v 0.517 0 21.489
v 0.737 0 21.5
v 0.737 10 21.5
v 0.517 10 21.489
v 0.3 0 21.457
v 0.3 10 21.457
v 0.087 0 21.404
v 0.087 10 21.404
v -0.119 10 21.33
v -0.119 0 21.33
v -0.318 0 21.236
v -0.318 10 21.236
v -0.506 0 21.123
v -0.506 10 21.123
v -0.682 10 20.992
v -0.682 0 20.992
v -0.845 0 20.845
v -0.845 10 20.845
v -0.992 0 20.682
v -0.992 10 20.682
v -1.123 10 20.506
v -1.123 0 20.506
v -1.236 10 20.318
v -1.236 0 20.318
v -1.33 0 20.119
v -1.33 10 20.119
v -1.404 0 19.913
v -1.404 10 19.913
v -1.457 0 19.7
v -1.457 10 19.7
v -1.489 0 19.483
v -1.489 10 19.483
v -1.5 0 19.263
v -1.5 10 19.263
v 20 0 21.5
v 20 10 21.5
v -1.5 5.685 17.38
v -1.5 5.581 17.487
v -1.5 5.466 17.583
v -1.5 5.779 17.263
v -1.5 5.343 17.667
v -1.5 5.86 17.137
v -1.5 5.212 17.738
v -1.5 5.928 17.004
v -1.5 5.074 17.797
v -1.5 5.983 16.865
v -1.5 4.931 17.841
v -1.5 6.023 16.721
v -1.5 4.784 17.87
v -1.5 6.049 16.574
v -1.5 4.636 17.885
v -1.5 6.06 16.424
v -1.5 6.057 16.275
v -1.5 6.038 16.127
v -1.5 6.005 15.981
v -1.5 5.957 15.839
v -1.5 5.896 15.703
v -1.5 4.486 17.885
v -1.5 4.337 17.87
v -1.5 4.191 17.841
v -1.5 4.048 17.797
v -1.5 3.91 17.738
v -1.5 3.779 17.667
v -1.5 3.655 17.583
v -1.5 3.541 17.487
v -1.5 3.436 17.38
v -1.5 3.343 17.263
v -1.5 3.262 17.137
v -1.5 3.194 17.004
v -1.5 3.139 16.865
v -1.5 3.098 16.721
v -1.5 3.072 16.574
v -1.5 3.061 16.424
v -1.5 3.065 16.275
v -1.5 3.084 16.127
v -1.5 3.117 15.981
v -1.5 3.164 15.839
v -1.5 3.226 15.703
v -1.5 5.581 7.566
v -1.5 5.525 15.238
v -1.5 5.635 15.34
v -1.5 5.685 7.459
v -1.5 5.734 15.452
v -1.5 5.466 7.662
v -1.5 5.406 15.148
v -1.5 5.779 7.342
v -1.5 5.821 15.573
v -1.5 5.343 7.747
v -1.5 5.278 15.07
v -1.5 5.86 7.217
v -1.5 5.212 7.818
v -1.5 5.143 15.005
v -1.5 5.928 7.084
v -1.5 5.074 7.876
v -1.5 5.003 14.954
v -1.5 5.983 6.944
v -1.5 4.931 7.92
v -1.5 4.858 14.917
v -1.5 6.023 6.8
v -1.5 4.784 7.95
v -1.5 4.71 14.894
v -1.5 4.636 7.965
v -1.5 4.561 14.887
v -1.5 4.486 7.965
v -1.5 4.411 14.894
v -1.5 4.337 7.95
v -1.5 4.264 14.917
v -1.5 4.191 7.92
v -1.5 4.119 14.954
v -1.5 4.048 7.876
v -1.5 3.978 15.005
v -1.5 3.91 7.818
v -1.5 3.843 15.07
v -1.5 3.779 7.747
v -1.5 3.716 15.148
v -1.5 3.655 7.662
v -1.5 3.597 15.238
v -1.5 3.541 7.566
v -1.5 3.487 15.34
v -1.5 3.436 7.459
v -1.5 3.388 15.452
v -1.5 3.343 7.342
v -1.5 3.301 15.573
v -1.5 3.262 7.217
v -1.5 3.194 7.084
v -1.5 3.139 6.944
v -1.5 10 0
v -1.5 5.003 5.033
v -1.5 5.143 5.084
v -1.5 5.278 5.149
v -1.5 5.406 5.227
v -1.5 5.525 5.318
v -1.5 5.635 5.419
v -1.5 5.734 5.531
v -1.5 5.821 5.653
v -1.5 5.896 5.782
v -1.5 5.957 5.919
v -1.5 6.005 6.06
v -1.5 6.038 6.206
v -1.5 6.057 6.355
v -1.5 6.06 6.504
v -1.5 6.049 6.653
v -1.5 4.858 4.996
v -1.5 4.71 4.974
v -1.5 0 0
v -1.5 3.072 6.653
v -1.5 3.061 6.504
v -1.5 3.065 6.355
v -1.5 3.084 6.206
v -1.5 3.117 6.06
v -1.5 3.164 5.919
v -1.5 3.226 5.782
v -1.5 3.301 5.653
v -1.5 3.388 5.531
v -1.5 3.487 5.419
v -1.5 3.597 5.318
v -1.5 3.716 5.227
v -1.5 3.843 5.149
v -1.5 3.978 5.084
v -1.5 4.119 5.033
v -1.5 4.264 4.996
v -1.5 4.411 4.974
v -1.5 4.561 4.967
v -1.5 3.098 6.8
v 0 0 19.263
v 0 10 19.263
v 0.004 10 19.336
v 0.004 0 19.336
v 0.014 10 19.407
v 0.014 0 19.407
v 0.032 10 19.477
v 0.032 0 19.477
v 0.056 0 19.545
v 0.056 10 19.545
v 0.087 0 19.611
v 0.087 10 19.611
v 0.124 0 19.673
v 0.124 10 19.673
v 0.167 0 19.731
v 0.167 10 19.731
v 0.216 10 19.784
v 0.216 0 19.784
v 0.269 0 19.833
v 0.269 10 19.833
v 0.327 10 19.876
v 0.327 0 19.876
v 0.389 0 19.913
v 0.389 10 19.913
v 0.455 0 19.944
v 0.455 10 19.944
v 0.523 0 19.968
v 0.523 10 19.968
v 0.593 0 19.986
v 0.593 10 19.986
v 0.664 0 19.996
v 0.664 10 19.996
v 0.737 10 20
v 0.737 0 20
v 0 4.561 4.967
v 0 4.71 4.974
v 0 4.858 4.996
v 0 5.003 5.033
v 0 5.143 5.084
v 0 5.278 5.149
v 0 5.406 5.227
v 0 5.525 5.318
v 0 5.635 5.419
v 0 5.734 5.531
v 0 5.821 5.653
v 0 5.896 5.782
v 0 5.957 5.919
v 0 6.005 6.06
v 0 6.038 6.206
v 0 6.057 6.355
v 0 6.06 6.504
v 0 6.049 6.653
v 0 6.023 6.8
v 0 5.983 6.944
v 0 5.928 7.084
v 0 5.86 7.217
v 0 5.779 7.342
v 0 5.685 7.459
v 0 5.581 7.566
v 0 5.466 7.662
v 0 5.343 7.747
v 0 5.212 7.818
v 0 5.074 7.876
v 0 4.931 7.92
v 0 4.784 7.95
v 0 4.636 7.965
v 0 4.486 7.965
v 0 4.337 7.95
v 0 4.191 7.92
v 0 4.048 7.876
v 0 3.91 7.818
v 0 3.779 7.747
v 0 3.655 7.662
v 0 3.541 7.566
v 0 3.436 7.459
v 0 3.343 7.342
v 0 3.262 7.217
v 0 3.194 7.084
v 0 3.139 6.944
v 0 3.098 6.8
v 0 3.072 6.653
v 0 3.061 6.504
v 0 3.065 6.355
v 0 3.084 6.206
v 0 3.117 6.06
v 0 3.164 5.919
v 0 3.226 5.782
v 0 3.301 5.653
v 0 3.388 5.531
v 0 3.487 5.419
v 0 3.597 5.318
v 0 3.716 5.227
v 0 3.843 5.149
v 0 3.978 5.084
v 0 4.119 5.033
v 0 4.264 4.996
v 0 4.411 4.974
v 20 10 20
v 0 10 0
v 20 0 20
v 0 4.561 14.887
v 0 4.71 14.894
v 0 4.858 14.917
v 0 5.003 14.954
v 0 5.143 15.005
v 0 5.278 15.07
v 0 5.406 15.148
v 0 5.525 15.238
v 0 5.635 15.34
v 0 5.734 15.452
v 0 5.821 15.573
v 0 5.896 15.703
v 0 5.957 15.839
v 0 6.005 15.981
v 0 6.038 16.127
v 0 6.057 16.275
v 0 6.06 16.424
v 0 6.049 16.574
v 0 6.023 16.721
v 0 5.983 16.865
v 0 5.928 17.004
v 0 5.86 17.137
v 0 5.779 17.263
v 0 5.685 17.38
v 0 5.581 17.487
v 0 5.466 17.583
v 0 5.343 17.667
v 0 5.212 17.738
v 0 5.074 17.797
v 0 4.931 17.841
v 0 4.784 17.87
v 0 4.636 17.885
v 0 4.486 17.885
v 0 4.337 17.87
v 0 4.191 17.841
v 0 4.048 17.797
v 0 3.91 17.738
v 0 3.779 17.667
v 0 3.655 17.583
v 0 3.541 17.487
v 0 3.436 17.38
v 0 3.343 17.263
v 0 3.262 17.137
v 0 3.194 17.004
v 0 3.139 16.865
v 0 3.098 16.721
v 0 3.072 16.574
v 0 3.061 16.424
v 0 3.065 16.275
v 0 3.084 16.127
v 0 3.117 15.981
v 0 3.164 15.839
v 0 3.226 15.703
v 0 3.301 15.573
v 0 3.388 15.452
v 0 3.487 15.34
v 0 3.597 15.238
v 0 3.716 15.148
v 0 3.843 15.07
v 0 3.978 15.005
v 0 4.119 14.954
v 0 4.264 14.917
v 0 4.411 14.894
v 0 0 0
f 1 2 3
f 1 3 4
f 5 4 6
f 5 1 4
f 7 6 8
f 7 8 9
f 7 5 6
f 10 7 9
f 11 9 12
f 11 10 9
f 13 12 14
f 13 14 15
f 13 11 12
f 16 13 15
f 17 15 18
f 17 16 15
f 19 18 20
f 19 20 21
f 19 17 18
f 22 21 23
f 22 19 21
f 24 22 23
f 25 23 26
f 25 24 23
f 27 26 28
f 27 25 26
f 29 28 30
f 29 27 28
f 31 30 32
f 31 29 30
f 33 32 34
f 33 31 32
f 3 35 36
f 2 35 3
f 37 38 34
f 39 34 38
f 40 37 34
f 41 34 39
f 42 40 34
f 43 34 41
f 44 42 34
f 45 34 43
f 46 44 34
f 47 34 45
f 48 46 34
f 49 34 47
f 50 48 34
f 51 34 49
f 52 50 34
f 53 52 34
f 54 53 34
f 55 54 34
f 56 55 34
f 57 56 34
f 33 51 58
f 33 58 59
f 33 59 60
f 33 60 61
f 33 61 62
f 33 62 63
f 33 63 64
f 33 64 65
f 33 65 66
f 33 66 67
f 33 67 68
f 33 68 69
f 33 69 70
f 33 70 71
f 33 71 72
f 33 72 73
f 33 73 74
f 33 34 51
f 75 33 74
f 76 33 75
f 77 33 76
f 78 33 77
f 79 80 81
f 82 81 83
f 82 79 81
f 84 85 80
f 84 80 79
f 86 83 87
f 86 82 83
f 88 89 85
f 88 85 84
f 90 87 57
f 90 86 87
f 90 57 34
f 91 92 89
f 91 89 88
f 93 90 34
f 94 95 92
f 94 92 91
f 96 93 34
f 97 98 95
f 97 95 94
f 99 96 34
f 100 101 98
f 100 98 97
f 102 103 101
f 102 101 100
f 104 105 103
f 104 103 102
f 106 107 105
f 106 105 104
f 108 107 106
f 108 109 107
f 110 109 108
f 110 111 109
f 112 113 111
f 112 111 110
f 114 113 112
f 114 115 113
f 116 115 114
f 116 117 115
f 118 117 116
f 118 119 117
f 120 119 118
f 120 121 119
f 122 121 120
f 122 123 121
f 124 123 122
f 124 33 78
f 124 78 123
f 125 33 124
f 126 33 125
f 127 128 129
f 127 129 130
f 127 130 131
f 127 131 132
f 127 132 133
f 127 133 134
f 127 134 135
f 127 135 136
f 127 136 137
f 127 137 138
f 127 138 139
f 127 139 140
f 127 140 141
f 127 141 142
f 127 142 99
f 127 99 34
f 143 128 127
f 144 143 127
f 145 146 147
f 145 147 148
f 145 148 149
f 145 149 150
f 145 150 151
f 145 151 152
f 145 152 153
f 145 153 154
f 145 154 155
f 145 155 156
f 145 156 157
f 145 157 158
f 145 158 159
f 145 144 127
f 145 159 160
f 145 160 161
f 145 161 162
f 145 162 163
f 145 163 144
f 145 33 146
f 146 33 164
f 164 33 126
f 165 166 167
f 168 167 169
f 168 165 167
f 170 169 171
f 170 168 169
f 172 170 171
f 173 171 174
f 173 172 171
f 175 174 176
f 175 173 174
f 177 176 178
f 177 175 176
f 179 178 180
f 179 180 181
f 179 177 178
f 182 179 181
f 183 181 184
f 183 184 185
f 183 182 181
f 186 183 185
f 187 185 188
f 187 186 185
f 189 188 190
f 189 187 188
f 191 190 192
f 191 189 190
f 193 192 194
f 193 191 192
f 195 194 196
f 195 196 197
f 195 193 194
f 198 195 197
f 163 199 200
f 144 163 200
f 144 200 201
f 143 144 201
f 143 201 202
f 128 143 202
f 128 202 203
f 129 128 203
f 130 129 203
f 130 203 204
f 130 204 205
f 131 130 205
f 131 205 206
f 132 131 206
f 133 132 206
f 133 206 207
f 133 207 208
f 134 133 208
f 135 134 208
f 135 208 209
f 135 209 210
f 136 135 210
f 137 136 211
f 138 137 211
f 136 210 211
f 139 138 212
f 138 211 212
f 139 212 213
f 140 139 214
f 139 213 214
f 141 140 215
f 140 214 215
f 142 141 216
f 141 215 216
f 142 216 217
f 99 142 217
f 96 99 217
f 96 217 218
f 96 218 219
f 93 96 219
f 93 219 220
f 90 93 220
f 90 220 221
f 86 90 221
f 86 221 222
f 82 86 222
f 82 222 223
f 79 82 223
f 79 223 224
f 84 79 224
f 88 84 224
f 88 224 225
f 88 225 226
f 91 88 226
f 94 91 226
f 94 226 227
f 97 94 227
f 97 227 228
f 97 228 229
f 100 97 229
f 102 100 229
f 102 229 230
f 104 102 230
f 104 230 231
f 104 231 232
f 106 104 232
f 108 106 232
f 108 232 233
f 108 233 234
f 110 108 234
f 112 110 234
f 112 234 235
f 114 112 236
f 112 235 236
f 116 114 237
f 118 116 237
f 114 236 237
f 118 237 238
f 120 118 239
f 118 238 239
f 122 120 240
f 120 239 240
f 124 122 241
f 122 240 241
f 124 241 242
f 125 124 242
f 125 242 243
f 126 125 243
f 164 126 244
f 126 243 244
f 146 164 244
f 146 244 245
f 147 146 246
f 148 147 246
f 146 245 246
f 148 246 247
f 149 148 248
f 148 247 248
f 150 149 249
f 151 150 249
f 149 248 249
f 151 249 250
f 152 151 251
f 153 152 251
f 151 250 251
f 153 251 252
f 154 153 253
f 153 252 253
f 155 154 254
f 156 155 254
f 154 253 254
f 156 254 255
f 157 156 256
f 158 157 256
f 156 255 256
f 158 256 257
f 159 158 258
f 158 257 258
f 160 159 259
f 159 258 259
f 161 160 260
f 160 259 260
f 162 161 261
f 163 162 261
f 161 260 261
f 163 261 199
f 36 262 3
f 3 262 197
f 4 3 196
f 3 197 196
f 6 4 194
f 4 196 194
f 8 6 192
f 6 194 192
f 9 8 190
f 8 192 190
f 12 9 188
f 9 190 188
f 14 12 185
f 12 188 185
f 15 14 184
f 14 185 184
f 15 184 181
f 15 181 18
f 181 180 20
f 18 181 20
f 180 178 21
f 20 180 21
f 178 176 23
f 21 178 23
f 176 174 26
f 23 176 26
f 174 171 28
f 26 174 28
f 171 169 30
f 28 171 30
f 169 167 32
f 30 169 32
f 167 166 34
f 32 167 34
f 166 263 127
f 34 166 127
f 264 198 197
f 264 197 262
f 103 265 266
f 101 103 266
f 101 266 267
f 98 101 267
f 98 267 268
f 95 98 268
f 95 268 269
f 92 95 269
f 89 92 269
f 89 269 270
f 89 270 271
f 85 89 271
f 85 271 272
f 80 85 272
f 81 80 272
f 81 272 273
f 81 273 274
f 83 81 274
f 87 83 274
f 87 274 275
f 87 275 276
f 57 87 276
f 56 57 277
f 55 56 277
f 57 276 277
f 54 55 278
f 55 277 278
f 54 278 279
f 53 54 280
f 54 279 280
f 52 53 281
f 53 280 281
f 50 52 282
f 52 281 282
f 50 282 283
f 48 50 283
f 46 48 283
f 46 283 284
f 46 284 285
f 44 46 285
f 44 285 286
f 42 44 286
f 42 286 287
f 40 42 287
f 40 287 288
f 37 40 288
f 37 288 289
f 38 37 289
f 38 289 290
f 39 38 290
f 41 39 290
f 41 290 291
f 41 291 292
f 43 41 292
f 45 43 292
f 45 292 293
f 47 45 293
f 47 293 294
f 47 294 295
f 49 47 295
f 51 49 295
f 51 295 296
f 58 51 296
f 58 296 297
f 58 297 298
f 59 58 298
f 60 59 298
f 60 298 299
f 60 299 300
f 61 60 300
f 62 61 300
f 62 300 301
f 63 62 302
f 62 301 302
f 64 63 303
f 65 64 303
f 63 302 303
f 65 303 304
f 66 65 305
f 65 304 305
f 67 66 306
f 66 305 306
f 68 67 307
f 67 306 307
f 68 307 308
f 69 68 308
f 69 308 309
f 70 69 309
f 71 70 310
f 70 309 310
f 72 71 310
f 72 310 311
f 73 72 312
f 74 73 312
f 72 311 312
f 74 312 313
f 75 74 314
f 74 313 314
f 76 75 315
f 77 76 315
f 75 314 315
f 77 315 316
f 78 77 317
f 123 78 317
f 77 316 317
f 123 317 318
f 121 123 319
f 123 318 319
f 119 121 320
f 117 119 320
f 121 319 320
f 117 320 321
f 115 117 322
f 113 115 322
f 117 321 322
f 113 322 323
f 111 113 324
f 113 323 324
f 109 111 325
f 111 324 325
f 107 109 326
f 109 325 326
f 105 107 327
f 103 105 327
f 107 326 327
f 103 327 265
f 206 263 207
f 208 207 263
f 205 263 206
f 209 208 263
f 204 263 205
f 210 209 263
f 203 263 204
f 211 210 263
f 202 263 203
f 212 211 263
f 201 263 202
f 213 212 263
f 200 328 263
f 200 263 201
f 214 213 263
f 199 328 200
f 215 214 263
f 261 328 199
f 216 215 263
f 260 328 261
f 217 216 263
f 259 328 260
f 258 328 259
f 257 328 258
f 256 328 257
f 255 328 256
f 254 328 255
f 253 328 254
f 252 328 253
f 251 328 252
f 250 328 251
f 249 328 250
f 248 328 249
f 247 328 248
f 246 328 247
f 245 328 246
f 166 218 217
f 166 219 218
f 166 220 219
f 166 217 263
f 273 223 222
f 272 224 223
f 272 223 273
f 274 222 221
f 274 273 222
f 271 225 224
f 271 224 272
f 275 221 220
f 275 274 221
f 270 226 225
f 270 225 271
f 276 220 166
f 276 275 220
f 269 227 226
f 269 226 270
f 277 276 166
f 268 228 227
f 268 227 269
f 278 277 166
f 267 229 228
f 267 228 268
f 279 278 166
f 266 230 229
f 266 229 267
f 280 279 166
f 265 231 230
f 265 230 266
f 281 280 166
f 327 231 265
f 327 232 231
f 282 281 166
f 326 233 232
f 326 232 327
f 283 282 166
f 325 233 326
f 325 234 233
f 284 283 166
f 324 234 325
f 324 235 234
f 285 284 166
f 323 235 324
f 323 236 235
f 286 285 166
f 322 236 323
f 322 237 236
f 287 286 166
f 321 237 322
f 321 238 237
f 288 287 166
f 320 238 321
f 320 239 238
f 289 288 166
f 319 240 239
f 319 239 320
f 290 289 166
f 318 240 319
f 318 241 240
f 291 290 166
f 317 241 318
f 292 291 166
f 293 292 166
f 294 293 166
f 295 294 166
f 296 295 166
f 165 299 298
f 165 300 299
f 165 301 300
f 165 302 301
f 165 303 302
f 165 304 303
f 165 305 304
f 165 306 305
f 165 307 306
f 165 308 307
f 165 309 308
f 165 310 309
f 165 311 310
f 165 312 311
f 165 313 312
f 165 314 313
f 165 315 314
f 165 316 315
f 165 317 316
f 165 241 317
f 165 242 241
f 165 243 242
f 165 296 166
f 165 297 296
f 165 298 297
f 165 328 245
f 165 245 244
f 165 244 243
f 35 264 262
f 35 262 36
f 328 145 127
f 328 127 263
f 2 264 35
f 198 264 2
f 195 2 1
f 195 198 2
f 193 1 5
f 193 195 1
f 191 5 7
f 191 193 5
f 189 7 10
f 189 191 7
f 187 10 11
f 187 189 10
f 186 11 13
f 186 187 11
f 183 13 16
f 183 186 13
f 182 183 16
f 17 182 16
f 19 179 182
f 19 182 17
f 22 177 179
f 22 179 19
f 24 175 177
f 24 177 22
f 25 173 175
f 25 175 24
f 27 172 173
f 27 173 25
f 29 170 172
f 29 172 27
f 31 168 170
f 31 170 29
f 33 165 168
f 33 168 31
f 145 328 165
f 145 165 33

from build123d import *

# Parameters (mm, degrees)
BASE_FLANGE1_DEPTH                 = 10
F_3_0MM_TRANSITIONAL_DOWEL_HOLE1_D = 3


# Sheet-metal steps are written as plain solids
with BuildPart() as part:
    # Sketch1 → Base-Flange1 (new body)
    with BuildSketch(Plane(origin=(0, 0, 0), x_dir=(1, 0, 0), z_dir=(0, 1, 0))):
        with BuildLine():
            Line((0, 0), (0, -19.2634))
            ThreePointArc((0, -19.2634), (0.215745145, -19.784254855), (0.7366, -20))
            Line((0.7366, -20), (20, -20))
            Line((20, -20), (20, -21.5))
            Line((20, -21.5), (0.7366, -21.5))
            ThreePointArc((0.7366, -21.5), (-0.844915027, -20.844915027), (-1.5, -19.2634))
            Line((-1.5, -19.2634), (-1.5, 0))
            Line((-1.5, 0), (0, 0))
        make_face()
    extrude(amount=BASE_FLANGE1_DEPTH)

    # Ø3.0mm Transitional Dowel Hole1 (through all)
    with Locations(Plane.ZY.offset(1.5)):
        with Locations((16.387023366, 4.560762846), (6.466703516, 4.560762846)):
            Hole(F_3_0MM_TRANSITIONAL_DOWEL_HOLE1_D / 2)


solid = part.part
